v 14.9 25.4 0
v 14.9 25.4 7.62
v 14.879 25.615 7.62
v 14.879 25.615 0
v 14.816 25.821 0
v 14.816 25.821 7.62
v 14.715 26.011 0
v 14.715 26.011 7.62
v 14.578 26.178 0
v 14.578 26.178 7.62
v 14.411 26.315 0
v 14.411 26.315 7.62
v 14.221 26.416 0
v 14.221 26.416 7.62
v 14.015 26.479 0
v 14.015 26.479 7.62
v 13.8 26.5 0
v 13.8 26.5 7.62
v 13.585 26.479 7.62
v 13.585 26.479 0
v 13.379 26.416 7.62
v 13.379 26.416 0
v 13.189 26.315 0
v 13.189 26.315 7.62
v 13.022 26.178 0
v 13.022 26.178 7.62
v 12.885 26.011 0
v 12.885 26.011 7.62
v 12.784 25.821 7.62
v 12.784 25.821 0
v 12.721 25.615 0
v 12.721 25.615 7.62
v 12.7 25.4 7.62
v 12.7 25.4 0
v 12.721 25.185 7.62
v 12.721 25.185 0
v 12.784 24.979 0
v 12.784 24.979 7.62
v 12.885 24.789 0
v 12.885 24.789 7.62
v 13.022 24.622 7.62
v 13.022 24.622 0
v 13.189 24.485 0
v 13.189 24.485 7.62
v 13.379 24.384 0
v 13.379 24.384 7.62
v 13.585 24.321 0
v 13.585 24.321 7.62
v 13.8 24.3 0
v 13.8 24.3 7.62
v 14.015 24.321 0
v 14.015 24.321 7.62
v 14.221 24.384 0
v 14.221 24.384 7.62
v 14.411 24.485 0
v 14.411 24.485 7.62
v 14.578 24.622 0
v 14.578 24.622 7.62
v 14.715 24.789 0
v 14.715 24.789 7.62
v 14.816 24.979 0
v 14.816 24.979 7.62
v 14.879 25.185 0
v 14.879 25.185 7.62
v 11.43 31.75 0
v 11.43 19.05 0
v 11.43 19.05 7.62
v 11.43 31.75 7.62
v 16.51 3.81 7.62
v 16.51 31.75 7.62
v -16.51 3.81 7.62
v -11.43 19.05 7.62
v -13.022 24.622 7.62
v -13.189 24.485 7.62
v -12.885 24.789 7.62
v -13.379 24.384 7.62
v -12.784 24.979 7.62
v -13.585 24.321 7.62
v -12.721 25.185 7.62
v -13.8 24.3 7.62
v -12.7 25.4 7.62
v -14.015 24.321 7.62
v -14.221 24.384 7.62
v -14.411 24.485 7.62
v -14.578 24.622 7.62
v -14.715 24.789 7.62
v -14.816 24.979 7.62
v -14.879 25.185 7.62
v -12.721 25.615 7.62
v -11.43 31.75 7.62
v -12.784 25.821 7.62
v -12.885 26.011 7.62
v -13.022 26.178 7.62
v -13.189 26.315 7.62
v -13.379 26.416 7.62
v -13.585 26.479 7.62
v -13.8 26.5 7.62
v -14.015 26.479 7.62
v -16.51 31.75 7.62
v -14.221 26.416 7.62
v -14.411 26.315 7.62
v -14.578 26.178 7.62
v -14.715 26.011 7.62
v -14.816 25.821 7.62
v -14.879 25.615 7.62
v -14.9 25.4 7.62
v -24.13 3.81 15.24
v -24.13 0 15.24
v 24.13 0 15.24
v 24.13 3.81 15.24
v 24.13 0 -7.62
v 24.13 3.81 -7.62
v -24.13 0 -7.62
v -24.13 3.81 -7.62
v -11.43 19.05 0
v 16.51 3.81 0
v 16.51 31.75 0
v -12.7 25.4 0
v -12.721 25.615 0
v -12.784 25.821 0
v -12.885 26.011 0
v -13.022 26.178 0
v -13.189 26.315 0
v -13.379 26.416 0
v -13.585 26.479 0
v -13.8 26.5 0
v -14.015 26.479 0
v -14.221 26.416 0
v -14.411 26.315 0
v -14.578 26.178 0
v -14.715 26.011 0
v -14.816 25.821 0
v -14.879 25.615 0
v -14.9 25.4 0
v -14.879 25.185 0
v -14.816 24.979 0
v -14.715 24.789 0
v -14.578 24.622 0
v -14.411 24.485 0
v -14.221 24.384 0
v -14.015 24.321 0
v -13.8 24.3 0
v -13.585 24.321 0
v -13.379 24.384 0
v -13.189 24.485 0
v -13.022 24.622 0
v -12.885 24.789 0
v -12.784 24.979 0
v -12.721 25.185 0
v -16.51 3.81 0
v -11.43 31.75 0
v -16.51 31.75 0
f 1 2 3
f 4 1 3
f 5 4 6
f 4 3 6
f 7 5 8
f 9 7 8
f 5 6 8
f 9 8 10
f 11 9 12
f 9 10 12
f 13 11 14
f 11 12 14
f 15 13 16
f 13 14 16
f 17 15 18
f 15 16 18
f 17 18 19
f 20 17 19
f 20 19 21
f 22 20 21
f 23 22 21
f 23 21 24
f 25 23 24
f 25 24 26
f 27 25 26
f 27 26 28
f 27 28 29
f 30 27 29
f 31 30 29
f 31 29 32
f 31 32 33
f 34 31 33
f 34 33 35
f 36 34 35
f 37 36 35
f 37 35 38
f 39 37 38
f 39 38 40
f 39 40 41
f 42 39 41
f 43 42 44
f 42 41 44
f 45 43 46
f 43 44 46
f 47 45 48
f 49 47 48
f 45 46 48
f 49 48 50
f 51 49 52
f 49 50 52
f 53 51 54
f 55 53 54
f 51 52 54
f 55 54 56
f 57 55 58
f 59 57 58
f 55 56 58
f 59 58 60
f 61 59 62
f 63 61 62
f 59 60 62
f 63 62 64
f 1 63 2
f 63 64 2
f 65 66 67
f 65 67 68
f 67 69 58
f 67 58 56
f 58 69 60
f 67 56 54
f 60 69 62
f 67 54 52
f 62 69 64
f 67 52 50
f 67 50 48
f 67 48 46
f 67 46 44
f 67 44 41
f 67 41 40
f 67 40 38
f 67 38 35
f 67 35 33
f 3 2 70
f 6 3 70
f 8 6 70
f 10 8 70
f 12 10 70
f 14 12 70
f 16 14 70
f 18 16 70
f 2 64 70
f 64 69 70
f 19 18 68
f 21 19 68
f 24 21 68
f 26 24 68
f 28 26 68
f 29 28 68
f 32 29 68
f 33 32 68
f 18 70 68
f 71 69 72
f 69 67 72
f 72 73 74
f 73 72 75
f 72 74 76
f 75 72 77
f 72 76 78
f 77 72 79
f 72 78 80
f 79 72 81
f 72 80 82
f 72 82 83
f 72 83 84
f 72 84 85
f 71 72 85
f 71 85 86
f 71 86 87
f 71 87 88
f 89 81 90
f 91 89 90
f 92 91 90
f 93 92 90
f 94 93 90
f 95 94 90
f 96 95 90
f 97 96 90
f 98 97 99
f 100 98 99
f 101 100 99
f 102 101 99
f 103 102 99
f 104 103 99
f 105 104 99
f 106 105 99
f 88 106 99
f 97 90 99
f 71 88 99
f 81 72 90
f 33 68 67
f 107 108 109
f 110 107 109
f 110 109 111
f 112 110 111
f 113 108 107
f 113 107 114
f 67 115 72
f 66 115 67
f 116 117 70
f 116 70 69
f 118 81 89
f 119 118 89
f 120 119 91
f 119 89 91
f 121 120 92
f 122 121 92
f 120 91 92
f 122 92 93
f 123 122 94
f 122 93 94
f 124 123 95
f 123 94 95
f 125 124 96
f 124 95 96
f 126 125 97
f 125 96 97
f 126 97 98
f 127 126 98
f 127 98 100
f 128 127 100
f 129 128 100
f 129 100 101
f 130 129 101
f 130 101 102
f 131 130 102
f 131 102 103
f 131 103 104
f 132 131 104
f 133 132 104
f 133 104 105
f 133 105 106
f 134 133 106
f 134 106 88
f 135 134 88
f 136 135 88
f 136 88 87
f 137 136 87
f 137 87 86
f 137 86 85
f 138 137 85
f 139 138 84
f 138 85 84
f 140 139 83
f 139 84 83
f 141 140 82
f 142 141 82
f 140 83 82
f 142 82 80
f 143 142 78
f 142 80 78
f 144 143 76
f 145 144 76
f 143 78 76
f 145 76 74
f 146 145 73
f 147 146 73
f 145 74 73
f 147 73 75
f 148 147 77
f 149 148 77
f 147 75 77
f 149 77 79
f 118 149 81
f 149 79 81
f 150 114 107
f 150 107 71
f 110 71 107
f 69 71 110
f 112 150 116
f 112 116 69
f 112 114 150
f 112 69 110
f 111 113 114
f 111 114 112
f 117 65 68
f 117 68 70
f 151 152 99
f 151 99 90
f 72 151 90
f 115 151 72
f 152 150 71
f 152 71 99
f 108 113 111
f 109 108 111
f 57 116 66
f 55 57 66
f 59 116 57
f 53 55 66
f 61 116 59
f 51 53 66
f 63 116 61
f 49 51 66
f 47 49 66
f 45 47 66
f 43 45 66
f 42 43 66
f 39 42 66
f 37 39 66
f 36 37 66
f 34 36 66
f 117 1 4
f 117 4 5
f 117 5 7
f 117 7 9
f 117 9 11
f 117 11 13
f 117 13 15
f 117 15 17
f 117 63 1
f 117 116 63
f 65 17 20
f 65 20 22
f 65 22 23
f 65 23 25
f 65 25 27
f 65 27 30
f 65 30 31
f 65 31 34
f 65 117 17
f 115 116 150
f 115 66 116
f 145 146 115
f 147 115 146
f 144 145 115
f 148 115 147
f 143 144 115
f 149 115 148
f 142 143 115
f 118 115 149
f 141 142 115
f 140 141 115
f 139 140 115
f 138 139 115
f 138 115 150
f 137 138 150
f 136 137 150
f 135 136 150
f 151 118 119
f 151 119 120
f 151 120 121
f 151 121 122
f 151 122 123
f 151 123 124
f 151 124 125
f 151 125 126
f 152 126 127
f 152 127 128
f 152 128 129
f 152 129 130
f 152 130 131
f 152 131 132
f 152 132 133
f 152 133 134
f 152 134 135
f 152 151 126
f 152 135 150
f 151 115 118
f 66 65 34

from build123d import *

# Parameters (mm, degrees)
BOSS_EXTRUDE4_DEPTH  = 7.62
SKETCH7_W            = 48.26
SKETCH7_H            = 22.86
BOSS_EXTRUDE5_DEPTH  = 3.81
M2_CLEARANCE_HOLE1_D = 2.2


with BuildPart() as part:
    # Sketch6 → Boss-Extrude4 (new body)
    with BuildSketch(Plane.XY):
        Polygon((-11.43, 19.05), (11.43, 19.05), (11.43, 31.75), (16.51, 31.75), (16.51, 0), (-16.51, 0), (-16.51, 31.75), (-11.43, 31.75), align=None)
    extrude(amount=BOSS_EXTRUDE4_DEPTH)

    # Sketch7 → Boss-Extrude5 (add)
    with BuildSketch(Plane(origin=(0, 0, 0), x_dir=(1, 0, 0), z_dir=(0, 1, 0))):
        with Locations((0, -3.81)):
            Rectangle(SKETCH7_W, SKETCH7_H)
    extrude(amount=BOSS_EXTRUDE5_DEPTH)

    # M2 Clearance Hole1 (through all)
    with Locations(Plane(origin=(0, 0, 0), x_dir=(-1, 0, 0), z_dir=(0, 0, -1))):
        with Locations((-13.8, 25.4), (13.8, 25.4)):
            Hole(M2_CLEARANCE_HOLE1_D / 2)


solid = part.part
